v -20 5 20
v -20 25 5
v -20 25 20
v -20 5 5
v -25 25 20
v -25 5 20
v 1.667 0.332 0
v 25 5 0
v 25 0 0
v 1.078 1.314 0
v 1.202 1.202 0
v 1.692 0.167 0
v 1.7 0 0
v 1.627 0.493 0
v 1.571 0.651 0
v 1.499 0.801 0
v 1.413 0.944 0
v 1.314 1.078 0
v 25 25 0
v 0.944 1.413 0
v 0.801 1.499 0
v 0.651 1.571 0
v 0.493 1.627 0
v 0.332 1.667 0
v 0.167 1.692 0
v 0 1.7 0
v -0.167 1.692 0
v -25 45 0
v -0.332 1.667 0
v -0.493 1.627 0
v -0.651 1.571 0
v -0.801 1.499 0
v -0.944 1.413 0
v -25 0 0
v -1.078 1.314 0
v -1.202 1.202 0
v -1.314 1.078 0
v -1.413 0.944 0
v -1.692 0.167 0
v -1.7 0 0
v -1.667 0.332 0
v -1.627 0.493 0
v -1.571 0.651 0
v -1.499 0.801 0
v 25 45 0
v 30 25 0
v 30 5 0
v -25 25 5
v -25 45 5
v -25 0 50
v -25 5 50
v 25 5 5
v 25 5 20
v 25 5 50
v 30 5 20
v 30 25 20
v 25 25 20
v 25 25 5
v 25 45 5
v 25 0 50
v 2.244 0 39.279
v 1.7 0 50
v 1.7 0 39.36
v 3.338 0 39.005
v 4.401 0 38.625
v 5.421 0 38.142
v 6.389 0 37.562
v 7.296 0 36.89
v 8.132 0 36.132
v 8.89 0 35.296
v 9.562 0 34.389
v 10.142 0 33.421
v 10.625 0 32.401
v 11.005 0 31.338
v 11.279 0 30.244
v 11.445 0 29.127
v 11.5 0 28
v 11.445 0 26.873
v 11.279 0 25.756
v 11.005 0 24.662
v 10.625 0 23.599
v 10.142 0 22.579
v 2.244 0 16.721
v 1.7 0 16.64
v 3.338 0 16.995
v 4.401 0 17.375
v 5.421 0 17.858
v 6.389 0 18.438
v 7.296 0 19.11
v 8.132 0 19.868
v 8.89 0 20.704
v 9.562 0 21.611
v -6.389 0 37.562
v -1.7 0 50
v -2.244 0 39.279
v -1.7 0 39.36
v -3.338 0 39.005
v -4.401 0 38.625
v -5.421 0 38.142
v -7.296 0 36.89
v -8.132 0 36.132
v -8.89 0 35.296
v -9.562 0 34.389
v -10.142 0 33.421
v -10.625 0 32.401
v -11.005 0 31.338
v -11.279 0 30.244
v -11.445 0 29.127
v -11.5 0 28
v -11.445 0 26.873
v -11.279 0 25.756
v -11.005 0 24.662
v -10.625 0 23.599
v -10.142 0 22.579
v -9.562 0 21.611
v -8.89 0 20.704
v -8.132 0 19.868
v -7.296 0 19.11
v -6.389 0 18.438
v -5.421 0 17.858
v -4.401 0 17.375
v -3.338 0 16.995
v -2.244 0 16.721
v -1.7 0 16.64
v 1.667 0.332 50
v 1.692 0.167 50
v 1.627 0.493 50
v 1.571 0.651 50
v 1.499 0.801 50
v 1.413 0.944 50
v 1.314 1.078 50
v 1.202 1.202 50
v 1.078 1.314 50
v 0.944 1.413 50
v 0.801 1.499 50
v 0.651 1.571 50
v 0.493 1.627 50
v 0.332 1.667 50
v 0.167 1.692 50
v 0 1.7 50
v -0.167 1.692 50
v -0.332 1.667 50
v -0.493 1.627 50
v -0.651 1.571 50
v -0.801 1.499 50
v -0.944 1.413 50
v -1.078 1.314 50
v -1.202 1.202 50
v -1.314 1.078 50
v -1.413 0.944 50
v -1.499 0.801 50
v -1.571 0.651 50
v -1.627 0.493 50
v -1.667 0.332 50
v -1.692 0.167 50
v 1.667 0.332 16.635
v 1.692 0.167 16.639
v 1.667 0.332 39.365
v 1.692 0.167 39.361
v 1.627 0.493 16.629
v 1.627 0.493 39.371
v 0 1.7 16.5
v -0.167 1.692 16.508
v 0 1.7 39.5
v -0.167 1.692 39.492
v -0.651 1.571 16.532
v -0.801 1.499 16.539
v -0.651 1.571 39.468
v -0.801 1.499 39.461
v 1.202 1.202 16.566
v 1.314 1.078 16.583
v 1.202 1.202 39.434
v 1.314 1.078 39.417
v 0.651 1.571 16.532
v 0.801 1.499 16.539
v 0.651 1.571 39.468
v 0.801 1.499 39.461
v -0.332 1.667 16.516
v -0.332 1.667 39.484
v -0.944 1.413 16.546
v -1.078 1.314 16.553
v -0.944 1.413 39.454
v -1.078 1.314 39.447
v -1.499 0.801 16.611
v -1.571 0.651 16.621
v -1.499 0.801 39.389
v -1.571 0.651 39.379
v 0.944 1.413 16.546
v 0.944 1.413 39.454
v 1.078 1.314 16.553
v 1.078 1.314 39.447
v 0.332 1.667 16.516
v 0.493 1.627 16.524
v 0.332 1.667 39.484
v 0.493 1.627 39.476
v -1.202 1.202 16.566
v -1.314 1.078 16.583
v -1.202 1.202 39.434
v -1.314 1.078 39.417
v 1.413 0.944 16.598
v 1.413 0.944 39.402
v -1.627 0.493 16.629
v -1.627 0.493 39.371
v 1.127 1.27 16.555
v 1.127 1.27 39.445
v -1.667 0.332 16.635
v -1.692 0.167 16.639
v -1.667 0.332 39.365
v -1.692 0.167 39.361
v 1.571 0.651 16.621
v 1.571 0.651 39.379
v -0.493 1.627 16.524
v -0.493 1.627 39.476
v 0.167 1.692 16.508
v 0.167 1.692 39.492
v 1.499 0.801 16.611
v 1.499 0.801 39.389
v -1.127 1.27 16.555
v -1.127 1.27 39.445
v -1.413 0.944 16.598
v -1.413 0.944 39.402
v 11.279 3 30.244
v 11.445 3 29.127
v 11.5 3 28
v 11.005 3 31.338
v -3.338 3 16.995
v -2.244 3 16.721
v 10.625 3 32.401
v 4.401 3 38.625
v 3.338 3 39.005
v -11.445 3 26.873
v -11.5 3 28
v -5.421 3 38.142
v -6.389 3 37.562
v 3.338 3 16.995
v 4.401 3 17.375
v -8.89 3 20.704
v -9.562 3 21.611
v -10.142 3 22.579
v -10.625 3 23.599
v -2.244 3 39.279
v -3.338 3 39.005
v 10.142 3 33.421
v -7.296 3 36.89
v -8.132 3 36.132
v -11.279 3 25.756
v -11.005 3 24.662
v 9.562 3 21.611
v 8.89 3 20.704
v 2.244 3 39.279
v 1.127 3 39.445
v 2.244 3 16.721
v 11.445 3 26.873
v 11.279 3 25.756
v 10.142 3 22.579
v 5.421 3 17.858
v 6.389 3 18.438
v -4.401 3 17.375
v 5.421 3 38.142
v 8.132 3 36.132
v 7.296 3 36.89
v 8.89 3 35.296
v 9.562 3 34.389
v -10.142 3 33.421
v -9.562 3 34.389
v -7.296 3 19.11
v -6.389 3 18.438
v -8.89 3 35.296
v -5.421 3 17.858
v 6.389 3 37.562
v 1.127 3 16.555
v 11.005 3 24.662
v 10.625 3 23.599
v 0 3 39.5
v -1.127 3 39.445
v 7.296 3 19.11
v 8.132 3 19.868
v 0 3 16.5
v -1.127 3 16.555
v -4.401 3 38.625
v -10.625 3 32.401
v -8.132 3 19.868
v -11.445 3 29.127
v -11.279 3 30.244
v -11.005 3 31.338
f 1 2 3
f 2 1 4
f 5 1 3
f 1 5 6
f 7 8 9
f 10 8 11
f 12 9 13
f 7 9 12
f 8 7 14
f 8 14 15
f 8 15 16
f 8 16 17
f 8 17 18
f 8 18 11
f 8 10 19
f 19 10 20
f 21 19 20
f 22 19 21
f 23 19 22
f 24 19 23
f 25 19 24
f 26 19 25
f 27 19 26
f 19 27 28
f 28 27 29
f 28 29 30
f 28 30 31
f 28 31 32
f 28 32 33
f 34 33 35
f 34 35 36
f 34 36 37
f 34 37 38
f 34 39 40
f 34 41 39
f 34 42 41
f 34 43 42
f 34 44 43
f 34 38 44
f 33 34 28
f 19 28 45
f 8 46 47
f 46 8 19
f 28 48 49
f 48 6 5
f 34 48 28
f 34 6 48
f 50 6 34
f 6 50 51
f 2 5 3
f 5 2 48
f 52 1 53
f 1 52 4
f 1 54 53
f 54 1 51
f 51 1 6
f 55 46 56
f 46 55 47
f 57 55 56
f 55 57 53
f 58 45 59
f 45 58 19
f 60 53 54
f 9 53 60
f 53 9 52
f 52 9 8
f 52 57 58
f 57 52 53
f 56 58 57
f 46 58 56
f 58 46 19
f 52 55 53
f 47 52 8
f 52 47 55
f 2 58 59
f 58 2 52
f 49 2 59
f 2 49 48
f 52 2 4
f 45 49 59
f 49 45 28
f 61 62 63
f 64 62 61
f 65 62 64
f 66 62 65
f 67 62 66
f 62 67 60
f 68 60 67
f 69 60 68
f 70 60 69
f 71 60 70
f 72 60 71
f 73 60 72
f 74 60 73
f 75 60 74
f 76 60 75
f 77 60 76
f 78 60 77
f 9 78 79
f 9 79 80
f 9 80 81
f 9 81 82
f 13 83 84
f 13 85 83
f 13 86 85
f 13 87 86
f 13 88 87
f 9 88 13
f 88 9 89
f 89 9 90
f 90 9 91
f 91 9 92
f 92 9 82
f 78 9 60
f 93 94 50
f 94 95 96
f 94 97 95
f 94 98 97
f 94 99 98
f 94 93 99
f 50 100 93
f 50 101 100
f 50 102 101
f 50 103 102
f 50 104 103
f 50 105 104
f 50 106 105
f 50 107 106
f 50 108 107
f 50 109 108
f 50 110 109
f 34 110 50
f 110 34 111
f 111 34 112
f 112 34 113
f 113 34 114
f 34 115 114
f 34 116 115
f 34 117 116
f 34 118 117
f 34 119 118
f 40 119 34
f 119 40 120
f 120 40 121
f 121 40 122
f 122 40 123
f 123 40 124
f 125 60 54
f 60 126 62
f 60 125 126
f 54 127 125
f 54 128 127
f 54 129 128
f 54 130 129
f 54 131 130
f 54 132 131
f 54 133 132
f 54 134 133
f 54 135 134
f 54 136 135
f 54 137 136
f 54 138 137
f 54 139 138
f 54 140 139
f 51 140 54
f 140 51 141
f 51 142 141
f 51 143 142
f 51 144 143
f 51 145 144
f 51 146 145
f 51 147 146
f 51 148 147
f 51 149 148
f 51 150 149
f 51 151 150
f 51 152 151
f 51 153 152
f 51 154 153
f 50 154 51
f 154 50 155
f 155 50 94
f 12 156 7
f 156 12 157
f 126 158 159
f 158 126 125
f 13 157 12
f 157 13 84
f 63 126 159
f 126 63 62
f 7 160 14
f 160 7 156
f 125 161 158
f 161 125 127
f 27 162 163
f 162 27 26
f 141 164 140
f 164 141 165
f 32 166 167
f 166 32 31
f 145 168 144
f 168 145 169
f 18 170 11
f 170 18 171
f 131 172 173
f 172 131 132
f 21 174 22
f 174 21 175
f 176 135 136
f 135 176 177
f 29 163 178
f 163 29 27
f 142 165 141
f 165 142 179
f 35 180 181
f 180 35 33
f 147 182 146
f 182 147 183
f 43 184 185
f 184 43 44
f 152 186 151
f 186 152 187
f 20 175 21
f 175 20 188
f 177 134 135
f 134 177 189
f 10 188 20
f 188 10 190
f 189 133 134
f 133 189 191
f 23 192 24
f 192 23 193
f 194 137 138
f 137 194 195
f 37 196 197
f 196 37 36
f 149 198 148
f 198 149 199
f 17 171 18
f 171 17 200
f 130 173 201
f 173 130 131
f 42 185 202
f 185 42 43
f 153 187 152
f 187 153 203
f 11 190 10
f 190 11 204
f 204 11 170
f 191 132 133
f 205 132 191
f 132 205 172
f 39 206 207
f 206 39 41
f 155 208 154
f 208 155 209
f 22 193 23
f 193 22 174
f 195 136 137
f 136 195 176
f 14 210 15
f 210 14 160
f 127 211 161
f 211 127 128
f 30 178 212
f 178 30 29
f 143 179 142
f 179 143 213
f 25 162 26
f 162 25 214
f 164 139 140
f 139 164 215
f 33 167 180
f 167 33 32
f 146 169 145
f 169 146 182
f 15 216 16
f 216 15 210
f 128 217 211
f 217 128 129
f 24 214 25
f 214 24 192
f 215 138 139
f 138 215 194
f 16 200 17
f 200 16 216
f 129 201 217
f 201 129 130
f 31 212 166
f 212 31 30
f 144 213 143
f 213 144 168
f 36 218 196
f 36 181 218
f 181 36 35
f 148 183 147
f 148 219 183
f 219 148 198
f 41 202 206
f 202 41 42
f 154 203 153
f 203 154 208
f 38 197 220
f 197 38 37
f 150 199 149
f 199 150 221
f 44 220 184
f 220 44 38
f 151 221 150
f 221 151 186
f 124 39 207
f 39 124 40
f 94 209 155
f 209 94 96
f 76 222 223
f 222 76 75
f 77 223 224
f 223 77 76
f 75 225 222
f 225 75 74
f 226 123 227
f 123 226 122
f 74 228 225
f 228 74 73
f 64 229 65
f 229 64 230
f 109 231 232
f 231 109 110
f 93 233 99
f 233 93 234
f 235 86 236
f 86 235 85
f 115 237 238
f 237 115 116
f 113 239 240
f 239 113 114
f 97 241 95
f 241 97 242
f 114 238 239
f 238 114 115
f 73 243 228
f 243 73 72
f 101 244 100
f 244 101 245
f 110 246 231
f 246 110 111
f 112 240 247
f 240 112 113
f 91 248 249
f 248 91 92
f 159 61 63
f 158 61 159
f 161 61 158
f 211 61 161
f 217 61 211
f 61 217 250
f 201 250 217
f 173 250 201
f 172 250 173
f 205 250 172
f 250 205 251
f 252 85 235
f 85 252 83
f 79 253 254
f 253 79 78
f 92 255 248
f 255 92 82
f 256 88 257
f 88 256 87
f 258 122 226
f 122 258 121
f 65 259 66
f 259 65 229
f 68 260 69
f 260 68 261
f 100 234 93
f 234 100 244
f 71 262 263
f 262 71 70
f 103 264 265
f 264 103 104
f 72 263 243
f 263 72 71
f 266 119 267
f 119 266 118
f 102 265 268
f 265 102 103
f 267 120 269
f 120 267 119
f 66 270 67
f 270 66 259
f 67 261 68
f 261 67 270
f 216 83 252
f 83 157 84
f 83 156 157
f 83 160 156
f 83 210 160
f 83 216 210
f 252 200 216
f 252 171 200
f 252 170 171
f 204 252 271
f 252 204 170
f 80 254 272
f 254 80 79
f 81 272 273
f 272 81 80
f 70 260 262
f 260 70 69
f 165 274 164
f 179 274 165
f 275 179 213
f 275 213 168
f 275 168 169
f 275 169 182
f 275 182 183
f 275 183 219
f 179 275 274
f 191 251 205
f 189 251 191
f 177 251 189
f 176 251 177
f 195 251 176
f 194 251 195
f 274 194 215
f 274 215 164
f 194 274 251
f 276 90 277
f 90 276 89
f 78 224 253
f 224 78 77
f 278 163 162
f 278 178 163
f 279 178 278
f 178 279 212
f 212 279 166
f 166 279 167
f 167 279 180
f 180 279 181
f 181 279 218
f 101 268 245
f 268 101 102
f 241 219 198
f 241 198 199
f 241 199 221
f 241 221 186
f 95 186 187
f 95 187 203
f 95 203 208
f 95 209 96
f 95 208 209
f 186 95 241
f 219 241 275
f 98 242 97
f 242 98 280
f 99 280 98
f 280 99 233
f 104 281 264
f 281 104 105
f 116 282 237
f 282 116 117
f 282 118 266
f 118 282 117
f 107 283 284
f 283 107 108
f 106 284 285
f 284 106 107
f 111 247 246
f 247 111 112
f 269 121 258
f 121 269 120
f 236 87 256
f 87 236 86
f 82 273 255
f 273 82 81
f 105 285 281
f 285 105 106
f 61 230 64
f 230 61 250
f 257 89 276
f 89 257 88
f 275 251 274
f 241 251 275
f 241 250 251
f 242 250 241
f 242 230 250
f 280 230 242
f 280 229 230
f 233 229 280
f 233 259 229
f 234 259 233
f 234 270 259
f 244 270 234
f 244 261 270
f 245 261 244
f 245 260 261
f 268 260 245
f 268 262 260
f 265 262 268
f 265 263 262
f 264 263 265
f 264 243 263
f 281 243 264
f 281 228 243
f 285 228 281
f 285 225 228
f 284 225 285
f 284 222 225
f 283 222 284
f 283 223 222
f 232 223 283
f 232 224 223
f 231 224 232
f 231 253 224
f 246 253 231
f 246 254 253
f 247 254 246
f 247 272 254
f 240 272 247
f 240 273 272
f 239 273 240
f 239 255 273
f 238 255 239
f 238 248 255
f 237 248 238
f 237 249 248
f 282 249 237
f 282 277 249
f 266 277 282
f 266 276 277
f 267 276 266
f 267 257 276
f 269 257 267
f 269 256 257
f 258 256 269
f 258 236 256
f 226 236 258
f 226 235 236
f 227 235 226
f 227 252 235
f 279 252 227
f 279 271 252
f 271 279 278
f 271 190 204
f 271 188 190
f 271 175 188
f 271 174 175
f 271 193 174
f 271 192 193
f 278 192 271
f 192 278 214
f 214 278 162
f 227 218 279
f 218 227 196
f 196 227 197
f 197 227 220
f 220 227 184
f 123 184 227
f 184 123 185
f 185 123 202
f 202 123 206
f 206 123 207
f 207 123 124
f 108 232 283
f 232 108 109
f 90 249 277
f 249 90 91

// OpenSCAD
// L-shaped mounting bracket for NEMA 17 stepper motor (e.g. syringe pump)
// Print orientation: base plate on bed, motor plate building upward (+Z)

$fn = 64;

// ---- Base plate ----
base_x0 = -25;      // plate x start
base_x1 = 25;       // plate x end
base_y0 = 0;        // plate y start
base_y1 = 45;       // plate y end
base_z  = 5;        // plate thickness (z)

// ---- Motor plate ----
motor_x0 = -25;     // plate x start
motor_x1 = 25;      // plate x end
motor_y0 = 0;       // plate y start
motor_y1 = 5;       // plate y end
motor_z  = 50;      // plate height (z)

// ---- Boss hole (motor centring) ----
boss_d     = 23;    // hole diameter
boss_x     = 0;     // hole centre x
boss_z     = 28;    // hole centre z

// ---- Screw holes ----
screw_d    = 3.4;   // hole diameter (M3)
screw_n    = 4;     // number of holes
screw_pitch = 31;   // square pattern side length
screw_x0   = -15.5; // first hole x offset

// ---- Gussets ----
gusset_t      = 5;     // gusset thickness (x)
gusset_y      = 20;    // leg length along +Y
gusset_z      = 20;    // leg length along +Z
gusset_x_start = -25;   // left gusset x start
gusset_x_end   = 25;    // right gusset x end

// ---- Misc ----
eps = 0.5;          // cutter overshoot past faces

difference() {
    union() {
        // Base plate
        translate([base_x0, base_y0, 0])
            cube([base_x1 - base_x0, base_y1 - base_y0, base_z]);

        // Motor plate, standing on back edge of base
        translate([motor_x0, motor_y0, 0])
            cube([motor_x1 - motor_x0, motor_y1 - motor_y0, motor_z]);

        // Gussets, flush with left and right edges
        for (x = [gusset_x_start, gusset_x_end])
            translate([x, motor_y1, 0])
                cube([gusset_t, gusset_y, gusset_z]);
    }

    // Boss hole through motor plate (along Y)
    translate([boss_x, 0, boss_z])
        rotate([90, 0, 0])
            cylinder(d = boss_d, h = motor_y1 - motor_y0 + 2 * eps, center = true);

    // Screw holes on square pattern
    for (i = [0 : screw_n - 1]) {
        x = screw_x0 + (i % 2) * screw_pitch;
        z = screw_x0 + (i < 2) * screw_pitch;
        translate([x, 0, z])
            cylinder(d = screw_d, h = motor_z + 2 * eps);
    }
}
